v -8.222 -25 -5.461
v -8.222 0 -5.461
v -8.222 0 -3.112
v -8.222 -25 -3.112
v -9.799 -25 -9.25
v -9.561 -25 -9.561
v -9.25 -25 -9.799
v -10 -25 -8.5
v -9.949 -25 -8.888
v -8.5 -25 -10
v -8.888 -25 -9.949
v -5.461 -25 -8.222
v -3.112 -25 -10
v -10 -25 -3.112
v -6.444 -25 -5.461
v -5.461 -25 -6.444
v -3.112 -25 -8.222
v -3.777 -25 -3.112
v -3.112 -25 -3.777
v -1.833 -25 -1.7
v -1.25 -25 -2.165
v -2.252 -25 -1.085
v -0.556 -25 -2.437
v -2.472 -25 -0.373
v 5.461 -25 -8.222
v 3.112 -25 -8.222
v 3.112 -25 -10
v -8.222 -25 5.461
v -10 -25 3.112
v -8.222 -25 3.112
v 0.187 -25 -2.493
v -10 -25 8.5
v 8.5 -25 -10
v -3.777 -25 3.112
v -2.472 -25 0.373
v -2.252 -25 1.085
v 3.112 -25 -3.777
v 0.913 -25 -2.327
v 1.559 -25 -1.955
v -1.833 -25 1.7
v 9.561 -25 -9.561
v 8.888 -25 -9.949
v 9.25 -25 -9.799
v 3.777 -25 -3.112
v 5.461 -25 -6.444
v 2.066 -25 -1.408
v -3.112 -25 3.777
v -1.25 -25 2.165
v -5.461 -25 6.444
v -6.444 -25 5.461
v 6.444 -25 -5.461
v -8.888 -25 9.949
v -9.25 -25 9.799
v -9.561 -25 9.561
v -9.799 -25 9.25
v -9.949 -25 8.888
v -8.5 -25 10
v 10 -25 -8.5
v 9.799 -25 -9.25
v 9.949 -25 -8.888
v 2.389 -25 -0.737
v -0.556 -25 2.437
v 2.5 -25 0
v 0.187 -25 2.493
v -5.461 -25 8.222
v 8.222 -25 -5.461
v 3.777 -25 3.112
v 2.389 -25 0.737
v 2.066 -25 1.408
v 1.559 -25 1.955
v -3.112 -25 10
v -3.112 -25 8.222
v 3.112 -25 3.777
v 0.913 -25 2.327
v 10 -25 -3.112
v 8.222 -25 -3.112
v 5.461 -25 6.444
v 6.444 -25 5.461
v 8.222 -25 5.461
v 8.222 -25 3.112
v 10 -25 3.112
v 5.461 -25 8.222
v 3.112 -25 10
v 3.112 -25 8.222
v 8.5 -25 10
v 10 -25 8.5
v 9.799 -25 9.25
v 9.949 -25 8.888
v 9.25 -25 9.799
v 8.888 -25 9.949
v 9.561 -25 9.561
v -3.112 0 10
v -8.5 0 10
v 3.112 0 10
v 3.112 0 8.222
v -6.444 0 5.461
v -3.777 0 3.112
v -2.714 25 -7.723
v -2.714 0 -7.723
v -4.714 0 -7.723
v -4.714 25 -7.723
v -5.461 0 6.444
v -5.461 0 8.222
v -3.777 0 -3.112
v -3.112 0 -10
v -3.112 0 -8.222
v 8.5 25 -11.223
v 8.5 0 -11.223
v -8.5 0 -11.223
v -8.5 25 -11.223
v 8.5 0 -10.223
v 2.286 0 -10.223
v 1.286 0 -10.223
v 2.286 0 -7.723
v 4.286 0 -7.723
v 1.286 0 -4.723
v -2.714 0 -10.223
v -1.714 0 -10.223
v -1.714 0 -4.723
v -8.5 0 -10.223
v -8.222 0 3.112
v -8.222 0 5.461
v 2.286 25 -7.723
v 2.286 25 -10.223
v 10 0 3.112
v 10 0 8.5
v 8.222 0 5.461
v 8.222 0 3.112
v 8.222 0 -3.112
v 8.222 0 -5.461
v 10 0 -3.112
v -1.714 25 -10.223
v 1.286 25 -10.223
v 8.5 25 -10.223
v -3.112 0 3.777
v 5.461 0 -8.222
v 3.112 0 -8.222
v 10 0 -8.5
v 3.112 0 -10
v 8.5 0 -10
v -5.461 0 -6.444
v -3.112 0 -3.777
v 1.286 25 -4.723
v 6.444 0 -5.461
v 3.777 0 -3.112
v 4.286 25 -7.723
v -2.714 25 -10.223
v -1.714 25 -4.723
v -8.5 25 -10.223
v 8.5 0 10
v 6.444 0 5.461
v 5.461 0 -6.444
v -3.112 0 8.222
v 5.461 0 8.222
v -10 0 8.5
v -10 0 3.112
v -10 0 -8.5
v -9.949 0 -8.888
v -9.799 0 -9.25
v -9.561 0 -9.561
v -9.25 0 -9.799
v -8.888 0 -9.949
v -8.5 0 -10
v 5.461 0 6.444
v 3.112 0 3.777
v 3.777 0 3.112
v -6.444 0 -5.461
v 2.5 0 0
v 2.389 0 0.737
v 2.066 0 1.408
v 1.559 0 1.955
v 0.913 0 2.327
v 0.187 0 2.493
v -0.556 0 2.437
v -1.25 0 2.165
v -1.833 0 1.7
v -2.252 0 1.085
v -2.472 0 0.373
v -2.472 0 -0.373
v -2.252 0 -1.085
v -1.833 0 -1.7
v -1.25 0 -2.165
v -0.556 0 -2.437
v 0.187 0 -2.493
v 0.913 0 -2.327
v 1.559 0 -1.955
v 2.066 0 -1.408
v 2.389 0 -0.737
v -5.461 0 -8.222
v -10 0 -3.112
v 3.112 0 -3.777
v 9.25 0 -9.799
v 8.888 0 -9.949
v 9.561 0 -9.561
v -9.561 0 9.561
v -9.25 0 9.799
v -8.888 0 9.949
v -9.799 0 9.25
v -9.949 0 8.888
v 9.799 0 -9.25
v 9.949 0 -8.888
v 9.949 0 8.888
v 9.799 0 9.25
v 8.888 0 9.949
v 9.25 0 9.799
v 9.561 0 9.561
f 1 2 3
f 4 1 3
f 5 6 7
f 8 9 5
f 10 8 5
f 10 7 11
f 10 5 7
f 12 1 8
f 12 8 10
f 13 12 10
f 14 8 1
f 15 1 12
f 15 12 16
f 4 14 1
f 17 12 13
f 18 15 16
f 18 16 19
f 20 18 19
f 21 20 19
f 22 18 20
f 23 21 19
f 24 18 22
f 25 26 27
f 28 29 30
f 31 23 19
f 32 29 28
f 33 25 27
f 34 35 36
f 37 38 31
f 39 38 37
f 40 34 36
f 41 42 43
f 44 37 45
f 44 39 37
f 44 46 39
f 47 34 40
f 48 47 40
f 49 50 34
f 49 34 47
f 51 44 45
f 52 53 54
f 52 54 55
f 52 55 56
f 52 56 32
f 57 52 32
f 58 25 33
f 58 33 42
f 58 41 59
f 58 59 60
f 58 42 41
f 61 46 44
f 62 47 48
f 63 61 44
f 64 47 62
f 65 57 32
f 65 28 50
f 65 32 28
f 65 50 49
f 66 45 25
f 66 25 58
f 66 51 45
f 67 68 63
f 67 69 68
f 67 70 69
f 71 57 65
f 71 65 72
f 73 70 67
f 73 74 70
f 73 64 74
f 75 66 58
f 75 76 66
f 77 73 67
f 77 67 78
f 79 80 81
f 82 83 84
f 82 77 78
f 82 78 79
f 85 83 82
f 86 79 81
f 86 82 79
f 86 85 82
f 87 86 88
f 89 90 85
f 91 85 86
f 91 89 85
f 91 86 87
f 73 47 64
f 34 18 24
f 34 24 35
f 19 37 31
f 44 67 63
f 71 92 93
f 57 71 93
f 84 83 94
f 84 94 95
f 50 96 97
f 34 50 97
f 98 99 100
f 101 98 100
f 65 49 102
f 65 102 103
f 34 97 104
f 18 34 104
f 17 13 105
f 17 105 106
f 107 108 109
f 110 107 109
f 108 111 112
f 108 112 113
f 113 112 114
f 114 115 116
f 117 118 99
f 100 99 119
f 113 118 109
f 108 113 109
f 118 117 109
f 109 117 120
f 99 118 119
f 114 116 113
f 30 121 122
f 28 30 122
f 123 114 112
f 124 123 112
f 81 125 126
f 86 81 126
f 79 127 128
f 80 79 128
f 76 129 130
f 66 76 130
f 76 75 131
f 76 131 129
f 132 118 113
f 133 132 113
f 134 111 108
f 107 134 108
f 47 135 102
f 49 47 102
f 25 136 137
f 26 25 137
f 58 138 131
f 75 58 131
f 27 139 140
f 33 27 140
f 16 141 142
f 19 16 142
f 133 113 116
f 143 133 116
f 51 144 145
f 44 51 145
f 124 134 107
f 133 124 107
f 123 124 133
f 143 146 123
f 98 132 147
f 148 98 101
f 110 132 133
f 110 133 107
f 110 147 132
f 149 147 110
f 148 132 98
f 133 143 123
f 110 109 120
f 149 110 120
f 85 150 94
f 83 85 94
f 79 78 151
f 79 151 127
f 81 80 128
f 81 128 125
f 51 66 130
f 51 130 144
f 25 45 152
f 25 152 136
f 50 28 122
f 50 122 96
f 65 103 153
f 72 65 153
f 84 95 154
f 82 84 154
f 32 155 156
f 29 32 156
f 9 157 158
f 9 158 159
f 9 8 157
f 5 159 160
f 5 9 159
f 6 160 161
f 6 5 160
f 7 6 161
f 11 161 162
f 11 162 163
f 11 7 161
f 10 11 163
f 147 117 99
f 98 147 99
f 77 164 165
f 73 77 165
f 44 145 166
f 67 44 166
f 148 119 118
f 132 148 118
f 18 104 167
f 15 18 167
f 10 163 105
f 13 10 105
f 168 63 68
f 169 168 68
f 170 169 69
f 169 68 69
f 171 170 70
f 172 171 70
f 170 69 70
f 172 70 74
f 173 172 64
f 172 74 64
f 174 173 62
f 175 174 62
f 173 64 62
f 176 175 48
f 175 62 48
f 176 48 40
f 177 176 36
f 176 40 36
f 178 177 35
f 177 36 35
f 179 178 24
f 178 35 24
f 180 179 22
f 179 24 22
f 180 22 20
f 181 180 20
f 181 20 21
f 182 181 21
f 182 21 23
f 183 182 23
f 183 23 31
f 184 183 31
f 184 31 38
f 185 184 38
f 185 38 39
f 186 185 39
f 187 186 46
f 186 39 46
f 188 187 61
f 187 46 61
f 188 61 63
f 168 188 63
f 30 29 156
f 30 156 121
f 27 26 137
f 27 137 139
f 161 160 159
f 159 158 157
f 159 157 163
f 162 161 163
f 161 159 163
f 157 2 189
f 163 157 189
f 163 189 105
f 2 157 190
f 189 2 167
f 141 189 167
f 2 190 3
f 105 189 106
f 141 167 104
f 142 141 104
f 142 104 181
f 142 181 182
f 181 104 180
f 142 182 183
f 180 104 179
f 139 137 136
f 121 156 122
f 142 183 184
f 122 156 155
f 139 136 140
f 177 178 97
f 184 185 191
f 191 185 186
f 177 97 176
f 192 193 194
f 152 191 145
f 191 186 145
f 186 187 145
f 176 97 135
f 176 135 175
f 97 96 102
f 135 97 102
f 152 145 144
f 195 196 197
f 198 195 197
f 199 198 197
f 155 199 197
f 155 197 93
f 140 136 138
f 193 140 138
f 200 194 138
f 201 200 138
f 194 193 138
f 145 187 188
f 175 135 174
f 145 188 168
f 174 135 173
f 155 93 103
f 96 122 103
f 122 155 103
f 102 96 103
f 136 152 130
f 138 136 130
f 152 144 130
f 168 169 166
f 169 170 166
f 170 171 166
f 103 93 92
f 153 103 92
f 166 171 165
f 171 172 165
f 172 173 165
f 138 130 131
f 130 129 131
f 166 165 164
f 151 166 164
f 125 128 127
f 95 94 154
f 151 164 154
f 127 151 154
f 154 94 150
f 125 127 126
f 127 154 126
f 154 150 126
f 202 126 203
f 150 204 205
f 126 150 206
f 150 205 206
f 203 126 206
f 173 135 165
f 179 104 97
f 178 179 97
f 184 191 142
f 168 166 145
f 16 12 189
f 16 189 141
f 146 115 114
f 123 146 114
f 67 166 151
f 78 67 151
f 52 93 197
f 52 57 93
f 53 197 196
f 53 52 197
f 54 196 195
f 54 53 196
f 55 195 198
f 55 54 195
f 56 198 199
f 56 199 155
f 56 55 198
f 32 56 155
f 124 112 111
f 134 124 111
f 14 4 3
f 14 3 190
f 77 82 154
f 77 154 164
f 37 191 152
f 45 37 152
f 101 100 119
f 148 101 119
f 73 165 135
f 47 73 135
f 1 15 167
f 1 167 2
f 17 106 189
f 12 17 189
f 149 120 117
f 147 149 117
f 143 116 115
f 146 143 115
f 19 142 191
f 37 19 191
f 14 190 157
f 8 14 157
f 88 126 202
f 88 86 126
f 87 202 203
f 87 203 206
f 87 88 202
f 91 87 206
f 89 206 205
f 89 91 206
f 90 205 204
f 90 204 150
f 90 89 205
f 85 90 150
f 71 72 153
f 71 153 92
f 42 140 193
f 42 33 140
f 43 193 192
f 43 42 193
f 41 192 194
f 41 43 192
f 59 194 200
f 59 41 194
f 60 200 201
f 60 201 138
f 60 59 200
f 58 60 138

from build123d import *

# Parameters (mm, degrees)
F1_DEPTH = 25
F2_R     = 1.5
F3_R     = 2.5
F4_DEPTH = 25
F6_DEPTH = 25


with BuildPart() as f1:
    # F0 (on Front) → F1 (new body)
    with BuildSketch(Plane.XZ):
        Polygon((10, 3.1115), (10, 10), (3.1115, 10), (3.1115, 8.222), (5.461, 8.222), (5.461, 6.444), (3.1115, 3.777), (0, 3.777), (-3.1115, 3.777), (-5.461, 6.444), (-5.461, 8.222), (-3.1115, 8.222), (-3.1115, 10), (-10, 10), (-10, 3.1115), (-8.222, 3.1115), (-8.222, 5.461), (-6.444, 5.461), (-3.777, 3.1115), (-3.777, 0), (-3.777, -3.1115), (-6.444, -5.461), (-8.222, -5.461), (-8.222, -3.1115), (-10, -3.1115), (-10, -10), (-3.1115, -10), (-3.1115, -8.222), (-5.461, -8.222), (-5.461, -6.444), (-3.1115, -3.777), (0, -3.777), (3.1115, -3.777), (5.461, -6.444), (5.461, -8.222), (3.1115, -8.222), (3.1115, -10), (10, -10), (10, -3.1115), (8.222, -3.1115), (8.222, -5.461), (6.444, -5.461), (3.777, -3.1115), (3.777, 0), (3.777, 3.1115), (6.444, 5.461), (8.222, 5.461), (8.222, 3.1115), align=None)
    extrude(amount=F1_DEPTH)

    # F2
    f2_edges = [f1.edges().sort_by_distance(p)[0] for p in [
        (-10, -12.5, 10),
        (10, -12.5, 10),
        (10, -12.5, -10),
        (-10, -12.5, -10),
    ]]
    fillet(f2_edges, radius=F2_R)

    # F3 (on face) → F4 (cut, through all)
    with BuildSketch(Plane.XZ.offset(25)):
        Circle(F3_R)
    extrude(amount=-F4_DEPTH, mode=Mode.SUBTRACT)


with BuildPart() as f6:
    # F5 (on face) → F6 (new body)
    with BuildSketch(Plane(origin=(0, 0, 0), x_dir=(-1, 0, 0), z_dir=(0, 1, 0))):
        Polygon((8.5, -11.223161), (8.5, -10.223161), (2.71375, -10.223161), (1.71375, -10.223161), (-1.28625, -10.223161), (-2.28625, -10.223161), (-8.5, -10.223161), (-8.5, -11.223161), align=None)
        Polygon((1.71375, -10.223161), (2.71375, -10.223161), (2.71375, -7.723161), (2.71375, -6.723161), (1.71375, -6.723161), align=None)
        Polygon((-2.28625, -10.223161), (-1.28625, -10.223161), (-1.28625, -6.723161), (-2.28625, -6.723161), (-2.28625, -7.723161), align=None)
        Polygon((-2.28625, -6.723161), (-1.28625, -6.723161), (-1.28625, -4.723161), (-4.28625, -7.723161), (-2.28625, -7.723161), align=None)
        Polygon((2.71375, -6.723161), (2.71375, -7.723161), (4.71375, -7.723161), (1.71375, -4.723161), (1.71375, -6.723161), align=None)
    extrude(amount=F6_DEPTH)


solid = Compound([f1.part, f6.part])
